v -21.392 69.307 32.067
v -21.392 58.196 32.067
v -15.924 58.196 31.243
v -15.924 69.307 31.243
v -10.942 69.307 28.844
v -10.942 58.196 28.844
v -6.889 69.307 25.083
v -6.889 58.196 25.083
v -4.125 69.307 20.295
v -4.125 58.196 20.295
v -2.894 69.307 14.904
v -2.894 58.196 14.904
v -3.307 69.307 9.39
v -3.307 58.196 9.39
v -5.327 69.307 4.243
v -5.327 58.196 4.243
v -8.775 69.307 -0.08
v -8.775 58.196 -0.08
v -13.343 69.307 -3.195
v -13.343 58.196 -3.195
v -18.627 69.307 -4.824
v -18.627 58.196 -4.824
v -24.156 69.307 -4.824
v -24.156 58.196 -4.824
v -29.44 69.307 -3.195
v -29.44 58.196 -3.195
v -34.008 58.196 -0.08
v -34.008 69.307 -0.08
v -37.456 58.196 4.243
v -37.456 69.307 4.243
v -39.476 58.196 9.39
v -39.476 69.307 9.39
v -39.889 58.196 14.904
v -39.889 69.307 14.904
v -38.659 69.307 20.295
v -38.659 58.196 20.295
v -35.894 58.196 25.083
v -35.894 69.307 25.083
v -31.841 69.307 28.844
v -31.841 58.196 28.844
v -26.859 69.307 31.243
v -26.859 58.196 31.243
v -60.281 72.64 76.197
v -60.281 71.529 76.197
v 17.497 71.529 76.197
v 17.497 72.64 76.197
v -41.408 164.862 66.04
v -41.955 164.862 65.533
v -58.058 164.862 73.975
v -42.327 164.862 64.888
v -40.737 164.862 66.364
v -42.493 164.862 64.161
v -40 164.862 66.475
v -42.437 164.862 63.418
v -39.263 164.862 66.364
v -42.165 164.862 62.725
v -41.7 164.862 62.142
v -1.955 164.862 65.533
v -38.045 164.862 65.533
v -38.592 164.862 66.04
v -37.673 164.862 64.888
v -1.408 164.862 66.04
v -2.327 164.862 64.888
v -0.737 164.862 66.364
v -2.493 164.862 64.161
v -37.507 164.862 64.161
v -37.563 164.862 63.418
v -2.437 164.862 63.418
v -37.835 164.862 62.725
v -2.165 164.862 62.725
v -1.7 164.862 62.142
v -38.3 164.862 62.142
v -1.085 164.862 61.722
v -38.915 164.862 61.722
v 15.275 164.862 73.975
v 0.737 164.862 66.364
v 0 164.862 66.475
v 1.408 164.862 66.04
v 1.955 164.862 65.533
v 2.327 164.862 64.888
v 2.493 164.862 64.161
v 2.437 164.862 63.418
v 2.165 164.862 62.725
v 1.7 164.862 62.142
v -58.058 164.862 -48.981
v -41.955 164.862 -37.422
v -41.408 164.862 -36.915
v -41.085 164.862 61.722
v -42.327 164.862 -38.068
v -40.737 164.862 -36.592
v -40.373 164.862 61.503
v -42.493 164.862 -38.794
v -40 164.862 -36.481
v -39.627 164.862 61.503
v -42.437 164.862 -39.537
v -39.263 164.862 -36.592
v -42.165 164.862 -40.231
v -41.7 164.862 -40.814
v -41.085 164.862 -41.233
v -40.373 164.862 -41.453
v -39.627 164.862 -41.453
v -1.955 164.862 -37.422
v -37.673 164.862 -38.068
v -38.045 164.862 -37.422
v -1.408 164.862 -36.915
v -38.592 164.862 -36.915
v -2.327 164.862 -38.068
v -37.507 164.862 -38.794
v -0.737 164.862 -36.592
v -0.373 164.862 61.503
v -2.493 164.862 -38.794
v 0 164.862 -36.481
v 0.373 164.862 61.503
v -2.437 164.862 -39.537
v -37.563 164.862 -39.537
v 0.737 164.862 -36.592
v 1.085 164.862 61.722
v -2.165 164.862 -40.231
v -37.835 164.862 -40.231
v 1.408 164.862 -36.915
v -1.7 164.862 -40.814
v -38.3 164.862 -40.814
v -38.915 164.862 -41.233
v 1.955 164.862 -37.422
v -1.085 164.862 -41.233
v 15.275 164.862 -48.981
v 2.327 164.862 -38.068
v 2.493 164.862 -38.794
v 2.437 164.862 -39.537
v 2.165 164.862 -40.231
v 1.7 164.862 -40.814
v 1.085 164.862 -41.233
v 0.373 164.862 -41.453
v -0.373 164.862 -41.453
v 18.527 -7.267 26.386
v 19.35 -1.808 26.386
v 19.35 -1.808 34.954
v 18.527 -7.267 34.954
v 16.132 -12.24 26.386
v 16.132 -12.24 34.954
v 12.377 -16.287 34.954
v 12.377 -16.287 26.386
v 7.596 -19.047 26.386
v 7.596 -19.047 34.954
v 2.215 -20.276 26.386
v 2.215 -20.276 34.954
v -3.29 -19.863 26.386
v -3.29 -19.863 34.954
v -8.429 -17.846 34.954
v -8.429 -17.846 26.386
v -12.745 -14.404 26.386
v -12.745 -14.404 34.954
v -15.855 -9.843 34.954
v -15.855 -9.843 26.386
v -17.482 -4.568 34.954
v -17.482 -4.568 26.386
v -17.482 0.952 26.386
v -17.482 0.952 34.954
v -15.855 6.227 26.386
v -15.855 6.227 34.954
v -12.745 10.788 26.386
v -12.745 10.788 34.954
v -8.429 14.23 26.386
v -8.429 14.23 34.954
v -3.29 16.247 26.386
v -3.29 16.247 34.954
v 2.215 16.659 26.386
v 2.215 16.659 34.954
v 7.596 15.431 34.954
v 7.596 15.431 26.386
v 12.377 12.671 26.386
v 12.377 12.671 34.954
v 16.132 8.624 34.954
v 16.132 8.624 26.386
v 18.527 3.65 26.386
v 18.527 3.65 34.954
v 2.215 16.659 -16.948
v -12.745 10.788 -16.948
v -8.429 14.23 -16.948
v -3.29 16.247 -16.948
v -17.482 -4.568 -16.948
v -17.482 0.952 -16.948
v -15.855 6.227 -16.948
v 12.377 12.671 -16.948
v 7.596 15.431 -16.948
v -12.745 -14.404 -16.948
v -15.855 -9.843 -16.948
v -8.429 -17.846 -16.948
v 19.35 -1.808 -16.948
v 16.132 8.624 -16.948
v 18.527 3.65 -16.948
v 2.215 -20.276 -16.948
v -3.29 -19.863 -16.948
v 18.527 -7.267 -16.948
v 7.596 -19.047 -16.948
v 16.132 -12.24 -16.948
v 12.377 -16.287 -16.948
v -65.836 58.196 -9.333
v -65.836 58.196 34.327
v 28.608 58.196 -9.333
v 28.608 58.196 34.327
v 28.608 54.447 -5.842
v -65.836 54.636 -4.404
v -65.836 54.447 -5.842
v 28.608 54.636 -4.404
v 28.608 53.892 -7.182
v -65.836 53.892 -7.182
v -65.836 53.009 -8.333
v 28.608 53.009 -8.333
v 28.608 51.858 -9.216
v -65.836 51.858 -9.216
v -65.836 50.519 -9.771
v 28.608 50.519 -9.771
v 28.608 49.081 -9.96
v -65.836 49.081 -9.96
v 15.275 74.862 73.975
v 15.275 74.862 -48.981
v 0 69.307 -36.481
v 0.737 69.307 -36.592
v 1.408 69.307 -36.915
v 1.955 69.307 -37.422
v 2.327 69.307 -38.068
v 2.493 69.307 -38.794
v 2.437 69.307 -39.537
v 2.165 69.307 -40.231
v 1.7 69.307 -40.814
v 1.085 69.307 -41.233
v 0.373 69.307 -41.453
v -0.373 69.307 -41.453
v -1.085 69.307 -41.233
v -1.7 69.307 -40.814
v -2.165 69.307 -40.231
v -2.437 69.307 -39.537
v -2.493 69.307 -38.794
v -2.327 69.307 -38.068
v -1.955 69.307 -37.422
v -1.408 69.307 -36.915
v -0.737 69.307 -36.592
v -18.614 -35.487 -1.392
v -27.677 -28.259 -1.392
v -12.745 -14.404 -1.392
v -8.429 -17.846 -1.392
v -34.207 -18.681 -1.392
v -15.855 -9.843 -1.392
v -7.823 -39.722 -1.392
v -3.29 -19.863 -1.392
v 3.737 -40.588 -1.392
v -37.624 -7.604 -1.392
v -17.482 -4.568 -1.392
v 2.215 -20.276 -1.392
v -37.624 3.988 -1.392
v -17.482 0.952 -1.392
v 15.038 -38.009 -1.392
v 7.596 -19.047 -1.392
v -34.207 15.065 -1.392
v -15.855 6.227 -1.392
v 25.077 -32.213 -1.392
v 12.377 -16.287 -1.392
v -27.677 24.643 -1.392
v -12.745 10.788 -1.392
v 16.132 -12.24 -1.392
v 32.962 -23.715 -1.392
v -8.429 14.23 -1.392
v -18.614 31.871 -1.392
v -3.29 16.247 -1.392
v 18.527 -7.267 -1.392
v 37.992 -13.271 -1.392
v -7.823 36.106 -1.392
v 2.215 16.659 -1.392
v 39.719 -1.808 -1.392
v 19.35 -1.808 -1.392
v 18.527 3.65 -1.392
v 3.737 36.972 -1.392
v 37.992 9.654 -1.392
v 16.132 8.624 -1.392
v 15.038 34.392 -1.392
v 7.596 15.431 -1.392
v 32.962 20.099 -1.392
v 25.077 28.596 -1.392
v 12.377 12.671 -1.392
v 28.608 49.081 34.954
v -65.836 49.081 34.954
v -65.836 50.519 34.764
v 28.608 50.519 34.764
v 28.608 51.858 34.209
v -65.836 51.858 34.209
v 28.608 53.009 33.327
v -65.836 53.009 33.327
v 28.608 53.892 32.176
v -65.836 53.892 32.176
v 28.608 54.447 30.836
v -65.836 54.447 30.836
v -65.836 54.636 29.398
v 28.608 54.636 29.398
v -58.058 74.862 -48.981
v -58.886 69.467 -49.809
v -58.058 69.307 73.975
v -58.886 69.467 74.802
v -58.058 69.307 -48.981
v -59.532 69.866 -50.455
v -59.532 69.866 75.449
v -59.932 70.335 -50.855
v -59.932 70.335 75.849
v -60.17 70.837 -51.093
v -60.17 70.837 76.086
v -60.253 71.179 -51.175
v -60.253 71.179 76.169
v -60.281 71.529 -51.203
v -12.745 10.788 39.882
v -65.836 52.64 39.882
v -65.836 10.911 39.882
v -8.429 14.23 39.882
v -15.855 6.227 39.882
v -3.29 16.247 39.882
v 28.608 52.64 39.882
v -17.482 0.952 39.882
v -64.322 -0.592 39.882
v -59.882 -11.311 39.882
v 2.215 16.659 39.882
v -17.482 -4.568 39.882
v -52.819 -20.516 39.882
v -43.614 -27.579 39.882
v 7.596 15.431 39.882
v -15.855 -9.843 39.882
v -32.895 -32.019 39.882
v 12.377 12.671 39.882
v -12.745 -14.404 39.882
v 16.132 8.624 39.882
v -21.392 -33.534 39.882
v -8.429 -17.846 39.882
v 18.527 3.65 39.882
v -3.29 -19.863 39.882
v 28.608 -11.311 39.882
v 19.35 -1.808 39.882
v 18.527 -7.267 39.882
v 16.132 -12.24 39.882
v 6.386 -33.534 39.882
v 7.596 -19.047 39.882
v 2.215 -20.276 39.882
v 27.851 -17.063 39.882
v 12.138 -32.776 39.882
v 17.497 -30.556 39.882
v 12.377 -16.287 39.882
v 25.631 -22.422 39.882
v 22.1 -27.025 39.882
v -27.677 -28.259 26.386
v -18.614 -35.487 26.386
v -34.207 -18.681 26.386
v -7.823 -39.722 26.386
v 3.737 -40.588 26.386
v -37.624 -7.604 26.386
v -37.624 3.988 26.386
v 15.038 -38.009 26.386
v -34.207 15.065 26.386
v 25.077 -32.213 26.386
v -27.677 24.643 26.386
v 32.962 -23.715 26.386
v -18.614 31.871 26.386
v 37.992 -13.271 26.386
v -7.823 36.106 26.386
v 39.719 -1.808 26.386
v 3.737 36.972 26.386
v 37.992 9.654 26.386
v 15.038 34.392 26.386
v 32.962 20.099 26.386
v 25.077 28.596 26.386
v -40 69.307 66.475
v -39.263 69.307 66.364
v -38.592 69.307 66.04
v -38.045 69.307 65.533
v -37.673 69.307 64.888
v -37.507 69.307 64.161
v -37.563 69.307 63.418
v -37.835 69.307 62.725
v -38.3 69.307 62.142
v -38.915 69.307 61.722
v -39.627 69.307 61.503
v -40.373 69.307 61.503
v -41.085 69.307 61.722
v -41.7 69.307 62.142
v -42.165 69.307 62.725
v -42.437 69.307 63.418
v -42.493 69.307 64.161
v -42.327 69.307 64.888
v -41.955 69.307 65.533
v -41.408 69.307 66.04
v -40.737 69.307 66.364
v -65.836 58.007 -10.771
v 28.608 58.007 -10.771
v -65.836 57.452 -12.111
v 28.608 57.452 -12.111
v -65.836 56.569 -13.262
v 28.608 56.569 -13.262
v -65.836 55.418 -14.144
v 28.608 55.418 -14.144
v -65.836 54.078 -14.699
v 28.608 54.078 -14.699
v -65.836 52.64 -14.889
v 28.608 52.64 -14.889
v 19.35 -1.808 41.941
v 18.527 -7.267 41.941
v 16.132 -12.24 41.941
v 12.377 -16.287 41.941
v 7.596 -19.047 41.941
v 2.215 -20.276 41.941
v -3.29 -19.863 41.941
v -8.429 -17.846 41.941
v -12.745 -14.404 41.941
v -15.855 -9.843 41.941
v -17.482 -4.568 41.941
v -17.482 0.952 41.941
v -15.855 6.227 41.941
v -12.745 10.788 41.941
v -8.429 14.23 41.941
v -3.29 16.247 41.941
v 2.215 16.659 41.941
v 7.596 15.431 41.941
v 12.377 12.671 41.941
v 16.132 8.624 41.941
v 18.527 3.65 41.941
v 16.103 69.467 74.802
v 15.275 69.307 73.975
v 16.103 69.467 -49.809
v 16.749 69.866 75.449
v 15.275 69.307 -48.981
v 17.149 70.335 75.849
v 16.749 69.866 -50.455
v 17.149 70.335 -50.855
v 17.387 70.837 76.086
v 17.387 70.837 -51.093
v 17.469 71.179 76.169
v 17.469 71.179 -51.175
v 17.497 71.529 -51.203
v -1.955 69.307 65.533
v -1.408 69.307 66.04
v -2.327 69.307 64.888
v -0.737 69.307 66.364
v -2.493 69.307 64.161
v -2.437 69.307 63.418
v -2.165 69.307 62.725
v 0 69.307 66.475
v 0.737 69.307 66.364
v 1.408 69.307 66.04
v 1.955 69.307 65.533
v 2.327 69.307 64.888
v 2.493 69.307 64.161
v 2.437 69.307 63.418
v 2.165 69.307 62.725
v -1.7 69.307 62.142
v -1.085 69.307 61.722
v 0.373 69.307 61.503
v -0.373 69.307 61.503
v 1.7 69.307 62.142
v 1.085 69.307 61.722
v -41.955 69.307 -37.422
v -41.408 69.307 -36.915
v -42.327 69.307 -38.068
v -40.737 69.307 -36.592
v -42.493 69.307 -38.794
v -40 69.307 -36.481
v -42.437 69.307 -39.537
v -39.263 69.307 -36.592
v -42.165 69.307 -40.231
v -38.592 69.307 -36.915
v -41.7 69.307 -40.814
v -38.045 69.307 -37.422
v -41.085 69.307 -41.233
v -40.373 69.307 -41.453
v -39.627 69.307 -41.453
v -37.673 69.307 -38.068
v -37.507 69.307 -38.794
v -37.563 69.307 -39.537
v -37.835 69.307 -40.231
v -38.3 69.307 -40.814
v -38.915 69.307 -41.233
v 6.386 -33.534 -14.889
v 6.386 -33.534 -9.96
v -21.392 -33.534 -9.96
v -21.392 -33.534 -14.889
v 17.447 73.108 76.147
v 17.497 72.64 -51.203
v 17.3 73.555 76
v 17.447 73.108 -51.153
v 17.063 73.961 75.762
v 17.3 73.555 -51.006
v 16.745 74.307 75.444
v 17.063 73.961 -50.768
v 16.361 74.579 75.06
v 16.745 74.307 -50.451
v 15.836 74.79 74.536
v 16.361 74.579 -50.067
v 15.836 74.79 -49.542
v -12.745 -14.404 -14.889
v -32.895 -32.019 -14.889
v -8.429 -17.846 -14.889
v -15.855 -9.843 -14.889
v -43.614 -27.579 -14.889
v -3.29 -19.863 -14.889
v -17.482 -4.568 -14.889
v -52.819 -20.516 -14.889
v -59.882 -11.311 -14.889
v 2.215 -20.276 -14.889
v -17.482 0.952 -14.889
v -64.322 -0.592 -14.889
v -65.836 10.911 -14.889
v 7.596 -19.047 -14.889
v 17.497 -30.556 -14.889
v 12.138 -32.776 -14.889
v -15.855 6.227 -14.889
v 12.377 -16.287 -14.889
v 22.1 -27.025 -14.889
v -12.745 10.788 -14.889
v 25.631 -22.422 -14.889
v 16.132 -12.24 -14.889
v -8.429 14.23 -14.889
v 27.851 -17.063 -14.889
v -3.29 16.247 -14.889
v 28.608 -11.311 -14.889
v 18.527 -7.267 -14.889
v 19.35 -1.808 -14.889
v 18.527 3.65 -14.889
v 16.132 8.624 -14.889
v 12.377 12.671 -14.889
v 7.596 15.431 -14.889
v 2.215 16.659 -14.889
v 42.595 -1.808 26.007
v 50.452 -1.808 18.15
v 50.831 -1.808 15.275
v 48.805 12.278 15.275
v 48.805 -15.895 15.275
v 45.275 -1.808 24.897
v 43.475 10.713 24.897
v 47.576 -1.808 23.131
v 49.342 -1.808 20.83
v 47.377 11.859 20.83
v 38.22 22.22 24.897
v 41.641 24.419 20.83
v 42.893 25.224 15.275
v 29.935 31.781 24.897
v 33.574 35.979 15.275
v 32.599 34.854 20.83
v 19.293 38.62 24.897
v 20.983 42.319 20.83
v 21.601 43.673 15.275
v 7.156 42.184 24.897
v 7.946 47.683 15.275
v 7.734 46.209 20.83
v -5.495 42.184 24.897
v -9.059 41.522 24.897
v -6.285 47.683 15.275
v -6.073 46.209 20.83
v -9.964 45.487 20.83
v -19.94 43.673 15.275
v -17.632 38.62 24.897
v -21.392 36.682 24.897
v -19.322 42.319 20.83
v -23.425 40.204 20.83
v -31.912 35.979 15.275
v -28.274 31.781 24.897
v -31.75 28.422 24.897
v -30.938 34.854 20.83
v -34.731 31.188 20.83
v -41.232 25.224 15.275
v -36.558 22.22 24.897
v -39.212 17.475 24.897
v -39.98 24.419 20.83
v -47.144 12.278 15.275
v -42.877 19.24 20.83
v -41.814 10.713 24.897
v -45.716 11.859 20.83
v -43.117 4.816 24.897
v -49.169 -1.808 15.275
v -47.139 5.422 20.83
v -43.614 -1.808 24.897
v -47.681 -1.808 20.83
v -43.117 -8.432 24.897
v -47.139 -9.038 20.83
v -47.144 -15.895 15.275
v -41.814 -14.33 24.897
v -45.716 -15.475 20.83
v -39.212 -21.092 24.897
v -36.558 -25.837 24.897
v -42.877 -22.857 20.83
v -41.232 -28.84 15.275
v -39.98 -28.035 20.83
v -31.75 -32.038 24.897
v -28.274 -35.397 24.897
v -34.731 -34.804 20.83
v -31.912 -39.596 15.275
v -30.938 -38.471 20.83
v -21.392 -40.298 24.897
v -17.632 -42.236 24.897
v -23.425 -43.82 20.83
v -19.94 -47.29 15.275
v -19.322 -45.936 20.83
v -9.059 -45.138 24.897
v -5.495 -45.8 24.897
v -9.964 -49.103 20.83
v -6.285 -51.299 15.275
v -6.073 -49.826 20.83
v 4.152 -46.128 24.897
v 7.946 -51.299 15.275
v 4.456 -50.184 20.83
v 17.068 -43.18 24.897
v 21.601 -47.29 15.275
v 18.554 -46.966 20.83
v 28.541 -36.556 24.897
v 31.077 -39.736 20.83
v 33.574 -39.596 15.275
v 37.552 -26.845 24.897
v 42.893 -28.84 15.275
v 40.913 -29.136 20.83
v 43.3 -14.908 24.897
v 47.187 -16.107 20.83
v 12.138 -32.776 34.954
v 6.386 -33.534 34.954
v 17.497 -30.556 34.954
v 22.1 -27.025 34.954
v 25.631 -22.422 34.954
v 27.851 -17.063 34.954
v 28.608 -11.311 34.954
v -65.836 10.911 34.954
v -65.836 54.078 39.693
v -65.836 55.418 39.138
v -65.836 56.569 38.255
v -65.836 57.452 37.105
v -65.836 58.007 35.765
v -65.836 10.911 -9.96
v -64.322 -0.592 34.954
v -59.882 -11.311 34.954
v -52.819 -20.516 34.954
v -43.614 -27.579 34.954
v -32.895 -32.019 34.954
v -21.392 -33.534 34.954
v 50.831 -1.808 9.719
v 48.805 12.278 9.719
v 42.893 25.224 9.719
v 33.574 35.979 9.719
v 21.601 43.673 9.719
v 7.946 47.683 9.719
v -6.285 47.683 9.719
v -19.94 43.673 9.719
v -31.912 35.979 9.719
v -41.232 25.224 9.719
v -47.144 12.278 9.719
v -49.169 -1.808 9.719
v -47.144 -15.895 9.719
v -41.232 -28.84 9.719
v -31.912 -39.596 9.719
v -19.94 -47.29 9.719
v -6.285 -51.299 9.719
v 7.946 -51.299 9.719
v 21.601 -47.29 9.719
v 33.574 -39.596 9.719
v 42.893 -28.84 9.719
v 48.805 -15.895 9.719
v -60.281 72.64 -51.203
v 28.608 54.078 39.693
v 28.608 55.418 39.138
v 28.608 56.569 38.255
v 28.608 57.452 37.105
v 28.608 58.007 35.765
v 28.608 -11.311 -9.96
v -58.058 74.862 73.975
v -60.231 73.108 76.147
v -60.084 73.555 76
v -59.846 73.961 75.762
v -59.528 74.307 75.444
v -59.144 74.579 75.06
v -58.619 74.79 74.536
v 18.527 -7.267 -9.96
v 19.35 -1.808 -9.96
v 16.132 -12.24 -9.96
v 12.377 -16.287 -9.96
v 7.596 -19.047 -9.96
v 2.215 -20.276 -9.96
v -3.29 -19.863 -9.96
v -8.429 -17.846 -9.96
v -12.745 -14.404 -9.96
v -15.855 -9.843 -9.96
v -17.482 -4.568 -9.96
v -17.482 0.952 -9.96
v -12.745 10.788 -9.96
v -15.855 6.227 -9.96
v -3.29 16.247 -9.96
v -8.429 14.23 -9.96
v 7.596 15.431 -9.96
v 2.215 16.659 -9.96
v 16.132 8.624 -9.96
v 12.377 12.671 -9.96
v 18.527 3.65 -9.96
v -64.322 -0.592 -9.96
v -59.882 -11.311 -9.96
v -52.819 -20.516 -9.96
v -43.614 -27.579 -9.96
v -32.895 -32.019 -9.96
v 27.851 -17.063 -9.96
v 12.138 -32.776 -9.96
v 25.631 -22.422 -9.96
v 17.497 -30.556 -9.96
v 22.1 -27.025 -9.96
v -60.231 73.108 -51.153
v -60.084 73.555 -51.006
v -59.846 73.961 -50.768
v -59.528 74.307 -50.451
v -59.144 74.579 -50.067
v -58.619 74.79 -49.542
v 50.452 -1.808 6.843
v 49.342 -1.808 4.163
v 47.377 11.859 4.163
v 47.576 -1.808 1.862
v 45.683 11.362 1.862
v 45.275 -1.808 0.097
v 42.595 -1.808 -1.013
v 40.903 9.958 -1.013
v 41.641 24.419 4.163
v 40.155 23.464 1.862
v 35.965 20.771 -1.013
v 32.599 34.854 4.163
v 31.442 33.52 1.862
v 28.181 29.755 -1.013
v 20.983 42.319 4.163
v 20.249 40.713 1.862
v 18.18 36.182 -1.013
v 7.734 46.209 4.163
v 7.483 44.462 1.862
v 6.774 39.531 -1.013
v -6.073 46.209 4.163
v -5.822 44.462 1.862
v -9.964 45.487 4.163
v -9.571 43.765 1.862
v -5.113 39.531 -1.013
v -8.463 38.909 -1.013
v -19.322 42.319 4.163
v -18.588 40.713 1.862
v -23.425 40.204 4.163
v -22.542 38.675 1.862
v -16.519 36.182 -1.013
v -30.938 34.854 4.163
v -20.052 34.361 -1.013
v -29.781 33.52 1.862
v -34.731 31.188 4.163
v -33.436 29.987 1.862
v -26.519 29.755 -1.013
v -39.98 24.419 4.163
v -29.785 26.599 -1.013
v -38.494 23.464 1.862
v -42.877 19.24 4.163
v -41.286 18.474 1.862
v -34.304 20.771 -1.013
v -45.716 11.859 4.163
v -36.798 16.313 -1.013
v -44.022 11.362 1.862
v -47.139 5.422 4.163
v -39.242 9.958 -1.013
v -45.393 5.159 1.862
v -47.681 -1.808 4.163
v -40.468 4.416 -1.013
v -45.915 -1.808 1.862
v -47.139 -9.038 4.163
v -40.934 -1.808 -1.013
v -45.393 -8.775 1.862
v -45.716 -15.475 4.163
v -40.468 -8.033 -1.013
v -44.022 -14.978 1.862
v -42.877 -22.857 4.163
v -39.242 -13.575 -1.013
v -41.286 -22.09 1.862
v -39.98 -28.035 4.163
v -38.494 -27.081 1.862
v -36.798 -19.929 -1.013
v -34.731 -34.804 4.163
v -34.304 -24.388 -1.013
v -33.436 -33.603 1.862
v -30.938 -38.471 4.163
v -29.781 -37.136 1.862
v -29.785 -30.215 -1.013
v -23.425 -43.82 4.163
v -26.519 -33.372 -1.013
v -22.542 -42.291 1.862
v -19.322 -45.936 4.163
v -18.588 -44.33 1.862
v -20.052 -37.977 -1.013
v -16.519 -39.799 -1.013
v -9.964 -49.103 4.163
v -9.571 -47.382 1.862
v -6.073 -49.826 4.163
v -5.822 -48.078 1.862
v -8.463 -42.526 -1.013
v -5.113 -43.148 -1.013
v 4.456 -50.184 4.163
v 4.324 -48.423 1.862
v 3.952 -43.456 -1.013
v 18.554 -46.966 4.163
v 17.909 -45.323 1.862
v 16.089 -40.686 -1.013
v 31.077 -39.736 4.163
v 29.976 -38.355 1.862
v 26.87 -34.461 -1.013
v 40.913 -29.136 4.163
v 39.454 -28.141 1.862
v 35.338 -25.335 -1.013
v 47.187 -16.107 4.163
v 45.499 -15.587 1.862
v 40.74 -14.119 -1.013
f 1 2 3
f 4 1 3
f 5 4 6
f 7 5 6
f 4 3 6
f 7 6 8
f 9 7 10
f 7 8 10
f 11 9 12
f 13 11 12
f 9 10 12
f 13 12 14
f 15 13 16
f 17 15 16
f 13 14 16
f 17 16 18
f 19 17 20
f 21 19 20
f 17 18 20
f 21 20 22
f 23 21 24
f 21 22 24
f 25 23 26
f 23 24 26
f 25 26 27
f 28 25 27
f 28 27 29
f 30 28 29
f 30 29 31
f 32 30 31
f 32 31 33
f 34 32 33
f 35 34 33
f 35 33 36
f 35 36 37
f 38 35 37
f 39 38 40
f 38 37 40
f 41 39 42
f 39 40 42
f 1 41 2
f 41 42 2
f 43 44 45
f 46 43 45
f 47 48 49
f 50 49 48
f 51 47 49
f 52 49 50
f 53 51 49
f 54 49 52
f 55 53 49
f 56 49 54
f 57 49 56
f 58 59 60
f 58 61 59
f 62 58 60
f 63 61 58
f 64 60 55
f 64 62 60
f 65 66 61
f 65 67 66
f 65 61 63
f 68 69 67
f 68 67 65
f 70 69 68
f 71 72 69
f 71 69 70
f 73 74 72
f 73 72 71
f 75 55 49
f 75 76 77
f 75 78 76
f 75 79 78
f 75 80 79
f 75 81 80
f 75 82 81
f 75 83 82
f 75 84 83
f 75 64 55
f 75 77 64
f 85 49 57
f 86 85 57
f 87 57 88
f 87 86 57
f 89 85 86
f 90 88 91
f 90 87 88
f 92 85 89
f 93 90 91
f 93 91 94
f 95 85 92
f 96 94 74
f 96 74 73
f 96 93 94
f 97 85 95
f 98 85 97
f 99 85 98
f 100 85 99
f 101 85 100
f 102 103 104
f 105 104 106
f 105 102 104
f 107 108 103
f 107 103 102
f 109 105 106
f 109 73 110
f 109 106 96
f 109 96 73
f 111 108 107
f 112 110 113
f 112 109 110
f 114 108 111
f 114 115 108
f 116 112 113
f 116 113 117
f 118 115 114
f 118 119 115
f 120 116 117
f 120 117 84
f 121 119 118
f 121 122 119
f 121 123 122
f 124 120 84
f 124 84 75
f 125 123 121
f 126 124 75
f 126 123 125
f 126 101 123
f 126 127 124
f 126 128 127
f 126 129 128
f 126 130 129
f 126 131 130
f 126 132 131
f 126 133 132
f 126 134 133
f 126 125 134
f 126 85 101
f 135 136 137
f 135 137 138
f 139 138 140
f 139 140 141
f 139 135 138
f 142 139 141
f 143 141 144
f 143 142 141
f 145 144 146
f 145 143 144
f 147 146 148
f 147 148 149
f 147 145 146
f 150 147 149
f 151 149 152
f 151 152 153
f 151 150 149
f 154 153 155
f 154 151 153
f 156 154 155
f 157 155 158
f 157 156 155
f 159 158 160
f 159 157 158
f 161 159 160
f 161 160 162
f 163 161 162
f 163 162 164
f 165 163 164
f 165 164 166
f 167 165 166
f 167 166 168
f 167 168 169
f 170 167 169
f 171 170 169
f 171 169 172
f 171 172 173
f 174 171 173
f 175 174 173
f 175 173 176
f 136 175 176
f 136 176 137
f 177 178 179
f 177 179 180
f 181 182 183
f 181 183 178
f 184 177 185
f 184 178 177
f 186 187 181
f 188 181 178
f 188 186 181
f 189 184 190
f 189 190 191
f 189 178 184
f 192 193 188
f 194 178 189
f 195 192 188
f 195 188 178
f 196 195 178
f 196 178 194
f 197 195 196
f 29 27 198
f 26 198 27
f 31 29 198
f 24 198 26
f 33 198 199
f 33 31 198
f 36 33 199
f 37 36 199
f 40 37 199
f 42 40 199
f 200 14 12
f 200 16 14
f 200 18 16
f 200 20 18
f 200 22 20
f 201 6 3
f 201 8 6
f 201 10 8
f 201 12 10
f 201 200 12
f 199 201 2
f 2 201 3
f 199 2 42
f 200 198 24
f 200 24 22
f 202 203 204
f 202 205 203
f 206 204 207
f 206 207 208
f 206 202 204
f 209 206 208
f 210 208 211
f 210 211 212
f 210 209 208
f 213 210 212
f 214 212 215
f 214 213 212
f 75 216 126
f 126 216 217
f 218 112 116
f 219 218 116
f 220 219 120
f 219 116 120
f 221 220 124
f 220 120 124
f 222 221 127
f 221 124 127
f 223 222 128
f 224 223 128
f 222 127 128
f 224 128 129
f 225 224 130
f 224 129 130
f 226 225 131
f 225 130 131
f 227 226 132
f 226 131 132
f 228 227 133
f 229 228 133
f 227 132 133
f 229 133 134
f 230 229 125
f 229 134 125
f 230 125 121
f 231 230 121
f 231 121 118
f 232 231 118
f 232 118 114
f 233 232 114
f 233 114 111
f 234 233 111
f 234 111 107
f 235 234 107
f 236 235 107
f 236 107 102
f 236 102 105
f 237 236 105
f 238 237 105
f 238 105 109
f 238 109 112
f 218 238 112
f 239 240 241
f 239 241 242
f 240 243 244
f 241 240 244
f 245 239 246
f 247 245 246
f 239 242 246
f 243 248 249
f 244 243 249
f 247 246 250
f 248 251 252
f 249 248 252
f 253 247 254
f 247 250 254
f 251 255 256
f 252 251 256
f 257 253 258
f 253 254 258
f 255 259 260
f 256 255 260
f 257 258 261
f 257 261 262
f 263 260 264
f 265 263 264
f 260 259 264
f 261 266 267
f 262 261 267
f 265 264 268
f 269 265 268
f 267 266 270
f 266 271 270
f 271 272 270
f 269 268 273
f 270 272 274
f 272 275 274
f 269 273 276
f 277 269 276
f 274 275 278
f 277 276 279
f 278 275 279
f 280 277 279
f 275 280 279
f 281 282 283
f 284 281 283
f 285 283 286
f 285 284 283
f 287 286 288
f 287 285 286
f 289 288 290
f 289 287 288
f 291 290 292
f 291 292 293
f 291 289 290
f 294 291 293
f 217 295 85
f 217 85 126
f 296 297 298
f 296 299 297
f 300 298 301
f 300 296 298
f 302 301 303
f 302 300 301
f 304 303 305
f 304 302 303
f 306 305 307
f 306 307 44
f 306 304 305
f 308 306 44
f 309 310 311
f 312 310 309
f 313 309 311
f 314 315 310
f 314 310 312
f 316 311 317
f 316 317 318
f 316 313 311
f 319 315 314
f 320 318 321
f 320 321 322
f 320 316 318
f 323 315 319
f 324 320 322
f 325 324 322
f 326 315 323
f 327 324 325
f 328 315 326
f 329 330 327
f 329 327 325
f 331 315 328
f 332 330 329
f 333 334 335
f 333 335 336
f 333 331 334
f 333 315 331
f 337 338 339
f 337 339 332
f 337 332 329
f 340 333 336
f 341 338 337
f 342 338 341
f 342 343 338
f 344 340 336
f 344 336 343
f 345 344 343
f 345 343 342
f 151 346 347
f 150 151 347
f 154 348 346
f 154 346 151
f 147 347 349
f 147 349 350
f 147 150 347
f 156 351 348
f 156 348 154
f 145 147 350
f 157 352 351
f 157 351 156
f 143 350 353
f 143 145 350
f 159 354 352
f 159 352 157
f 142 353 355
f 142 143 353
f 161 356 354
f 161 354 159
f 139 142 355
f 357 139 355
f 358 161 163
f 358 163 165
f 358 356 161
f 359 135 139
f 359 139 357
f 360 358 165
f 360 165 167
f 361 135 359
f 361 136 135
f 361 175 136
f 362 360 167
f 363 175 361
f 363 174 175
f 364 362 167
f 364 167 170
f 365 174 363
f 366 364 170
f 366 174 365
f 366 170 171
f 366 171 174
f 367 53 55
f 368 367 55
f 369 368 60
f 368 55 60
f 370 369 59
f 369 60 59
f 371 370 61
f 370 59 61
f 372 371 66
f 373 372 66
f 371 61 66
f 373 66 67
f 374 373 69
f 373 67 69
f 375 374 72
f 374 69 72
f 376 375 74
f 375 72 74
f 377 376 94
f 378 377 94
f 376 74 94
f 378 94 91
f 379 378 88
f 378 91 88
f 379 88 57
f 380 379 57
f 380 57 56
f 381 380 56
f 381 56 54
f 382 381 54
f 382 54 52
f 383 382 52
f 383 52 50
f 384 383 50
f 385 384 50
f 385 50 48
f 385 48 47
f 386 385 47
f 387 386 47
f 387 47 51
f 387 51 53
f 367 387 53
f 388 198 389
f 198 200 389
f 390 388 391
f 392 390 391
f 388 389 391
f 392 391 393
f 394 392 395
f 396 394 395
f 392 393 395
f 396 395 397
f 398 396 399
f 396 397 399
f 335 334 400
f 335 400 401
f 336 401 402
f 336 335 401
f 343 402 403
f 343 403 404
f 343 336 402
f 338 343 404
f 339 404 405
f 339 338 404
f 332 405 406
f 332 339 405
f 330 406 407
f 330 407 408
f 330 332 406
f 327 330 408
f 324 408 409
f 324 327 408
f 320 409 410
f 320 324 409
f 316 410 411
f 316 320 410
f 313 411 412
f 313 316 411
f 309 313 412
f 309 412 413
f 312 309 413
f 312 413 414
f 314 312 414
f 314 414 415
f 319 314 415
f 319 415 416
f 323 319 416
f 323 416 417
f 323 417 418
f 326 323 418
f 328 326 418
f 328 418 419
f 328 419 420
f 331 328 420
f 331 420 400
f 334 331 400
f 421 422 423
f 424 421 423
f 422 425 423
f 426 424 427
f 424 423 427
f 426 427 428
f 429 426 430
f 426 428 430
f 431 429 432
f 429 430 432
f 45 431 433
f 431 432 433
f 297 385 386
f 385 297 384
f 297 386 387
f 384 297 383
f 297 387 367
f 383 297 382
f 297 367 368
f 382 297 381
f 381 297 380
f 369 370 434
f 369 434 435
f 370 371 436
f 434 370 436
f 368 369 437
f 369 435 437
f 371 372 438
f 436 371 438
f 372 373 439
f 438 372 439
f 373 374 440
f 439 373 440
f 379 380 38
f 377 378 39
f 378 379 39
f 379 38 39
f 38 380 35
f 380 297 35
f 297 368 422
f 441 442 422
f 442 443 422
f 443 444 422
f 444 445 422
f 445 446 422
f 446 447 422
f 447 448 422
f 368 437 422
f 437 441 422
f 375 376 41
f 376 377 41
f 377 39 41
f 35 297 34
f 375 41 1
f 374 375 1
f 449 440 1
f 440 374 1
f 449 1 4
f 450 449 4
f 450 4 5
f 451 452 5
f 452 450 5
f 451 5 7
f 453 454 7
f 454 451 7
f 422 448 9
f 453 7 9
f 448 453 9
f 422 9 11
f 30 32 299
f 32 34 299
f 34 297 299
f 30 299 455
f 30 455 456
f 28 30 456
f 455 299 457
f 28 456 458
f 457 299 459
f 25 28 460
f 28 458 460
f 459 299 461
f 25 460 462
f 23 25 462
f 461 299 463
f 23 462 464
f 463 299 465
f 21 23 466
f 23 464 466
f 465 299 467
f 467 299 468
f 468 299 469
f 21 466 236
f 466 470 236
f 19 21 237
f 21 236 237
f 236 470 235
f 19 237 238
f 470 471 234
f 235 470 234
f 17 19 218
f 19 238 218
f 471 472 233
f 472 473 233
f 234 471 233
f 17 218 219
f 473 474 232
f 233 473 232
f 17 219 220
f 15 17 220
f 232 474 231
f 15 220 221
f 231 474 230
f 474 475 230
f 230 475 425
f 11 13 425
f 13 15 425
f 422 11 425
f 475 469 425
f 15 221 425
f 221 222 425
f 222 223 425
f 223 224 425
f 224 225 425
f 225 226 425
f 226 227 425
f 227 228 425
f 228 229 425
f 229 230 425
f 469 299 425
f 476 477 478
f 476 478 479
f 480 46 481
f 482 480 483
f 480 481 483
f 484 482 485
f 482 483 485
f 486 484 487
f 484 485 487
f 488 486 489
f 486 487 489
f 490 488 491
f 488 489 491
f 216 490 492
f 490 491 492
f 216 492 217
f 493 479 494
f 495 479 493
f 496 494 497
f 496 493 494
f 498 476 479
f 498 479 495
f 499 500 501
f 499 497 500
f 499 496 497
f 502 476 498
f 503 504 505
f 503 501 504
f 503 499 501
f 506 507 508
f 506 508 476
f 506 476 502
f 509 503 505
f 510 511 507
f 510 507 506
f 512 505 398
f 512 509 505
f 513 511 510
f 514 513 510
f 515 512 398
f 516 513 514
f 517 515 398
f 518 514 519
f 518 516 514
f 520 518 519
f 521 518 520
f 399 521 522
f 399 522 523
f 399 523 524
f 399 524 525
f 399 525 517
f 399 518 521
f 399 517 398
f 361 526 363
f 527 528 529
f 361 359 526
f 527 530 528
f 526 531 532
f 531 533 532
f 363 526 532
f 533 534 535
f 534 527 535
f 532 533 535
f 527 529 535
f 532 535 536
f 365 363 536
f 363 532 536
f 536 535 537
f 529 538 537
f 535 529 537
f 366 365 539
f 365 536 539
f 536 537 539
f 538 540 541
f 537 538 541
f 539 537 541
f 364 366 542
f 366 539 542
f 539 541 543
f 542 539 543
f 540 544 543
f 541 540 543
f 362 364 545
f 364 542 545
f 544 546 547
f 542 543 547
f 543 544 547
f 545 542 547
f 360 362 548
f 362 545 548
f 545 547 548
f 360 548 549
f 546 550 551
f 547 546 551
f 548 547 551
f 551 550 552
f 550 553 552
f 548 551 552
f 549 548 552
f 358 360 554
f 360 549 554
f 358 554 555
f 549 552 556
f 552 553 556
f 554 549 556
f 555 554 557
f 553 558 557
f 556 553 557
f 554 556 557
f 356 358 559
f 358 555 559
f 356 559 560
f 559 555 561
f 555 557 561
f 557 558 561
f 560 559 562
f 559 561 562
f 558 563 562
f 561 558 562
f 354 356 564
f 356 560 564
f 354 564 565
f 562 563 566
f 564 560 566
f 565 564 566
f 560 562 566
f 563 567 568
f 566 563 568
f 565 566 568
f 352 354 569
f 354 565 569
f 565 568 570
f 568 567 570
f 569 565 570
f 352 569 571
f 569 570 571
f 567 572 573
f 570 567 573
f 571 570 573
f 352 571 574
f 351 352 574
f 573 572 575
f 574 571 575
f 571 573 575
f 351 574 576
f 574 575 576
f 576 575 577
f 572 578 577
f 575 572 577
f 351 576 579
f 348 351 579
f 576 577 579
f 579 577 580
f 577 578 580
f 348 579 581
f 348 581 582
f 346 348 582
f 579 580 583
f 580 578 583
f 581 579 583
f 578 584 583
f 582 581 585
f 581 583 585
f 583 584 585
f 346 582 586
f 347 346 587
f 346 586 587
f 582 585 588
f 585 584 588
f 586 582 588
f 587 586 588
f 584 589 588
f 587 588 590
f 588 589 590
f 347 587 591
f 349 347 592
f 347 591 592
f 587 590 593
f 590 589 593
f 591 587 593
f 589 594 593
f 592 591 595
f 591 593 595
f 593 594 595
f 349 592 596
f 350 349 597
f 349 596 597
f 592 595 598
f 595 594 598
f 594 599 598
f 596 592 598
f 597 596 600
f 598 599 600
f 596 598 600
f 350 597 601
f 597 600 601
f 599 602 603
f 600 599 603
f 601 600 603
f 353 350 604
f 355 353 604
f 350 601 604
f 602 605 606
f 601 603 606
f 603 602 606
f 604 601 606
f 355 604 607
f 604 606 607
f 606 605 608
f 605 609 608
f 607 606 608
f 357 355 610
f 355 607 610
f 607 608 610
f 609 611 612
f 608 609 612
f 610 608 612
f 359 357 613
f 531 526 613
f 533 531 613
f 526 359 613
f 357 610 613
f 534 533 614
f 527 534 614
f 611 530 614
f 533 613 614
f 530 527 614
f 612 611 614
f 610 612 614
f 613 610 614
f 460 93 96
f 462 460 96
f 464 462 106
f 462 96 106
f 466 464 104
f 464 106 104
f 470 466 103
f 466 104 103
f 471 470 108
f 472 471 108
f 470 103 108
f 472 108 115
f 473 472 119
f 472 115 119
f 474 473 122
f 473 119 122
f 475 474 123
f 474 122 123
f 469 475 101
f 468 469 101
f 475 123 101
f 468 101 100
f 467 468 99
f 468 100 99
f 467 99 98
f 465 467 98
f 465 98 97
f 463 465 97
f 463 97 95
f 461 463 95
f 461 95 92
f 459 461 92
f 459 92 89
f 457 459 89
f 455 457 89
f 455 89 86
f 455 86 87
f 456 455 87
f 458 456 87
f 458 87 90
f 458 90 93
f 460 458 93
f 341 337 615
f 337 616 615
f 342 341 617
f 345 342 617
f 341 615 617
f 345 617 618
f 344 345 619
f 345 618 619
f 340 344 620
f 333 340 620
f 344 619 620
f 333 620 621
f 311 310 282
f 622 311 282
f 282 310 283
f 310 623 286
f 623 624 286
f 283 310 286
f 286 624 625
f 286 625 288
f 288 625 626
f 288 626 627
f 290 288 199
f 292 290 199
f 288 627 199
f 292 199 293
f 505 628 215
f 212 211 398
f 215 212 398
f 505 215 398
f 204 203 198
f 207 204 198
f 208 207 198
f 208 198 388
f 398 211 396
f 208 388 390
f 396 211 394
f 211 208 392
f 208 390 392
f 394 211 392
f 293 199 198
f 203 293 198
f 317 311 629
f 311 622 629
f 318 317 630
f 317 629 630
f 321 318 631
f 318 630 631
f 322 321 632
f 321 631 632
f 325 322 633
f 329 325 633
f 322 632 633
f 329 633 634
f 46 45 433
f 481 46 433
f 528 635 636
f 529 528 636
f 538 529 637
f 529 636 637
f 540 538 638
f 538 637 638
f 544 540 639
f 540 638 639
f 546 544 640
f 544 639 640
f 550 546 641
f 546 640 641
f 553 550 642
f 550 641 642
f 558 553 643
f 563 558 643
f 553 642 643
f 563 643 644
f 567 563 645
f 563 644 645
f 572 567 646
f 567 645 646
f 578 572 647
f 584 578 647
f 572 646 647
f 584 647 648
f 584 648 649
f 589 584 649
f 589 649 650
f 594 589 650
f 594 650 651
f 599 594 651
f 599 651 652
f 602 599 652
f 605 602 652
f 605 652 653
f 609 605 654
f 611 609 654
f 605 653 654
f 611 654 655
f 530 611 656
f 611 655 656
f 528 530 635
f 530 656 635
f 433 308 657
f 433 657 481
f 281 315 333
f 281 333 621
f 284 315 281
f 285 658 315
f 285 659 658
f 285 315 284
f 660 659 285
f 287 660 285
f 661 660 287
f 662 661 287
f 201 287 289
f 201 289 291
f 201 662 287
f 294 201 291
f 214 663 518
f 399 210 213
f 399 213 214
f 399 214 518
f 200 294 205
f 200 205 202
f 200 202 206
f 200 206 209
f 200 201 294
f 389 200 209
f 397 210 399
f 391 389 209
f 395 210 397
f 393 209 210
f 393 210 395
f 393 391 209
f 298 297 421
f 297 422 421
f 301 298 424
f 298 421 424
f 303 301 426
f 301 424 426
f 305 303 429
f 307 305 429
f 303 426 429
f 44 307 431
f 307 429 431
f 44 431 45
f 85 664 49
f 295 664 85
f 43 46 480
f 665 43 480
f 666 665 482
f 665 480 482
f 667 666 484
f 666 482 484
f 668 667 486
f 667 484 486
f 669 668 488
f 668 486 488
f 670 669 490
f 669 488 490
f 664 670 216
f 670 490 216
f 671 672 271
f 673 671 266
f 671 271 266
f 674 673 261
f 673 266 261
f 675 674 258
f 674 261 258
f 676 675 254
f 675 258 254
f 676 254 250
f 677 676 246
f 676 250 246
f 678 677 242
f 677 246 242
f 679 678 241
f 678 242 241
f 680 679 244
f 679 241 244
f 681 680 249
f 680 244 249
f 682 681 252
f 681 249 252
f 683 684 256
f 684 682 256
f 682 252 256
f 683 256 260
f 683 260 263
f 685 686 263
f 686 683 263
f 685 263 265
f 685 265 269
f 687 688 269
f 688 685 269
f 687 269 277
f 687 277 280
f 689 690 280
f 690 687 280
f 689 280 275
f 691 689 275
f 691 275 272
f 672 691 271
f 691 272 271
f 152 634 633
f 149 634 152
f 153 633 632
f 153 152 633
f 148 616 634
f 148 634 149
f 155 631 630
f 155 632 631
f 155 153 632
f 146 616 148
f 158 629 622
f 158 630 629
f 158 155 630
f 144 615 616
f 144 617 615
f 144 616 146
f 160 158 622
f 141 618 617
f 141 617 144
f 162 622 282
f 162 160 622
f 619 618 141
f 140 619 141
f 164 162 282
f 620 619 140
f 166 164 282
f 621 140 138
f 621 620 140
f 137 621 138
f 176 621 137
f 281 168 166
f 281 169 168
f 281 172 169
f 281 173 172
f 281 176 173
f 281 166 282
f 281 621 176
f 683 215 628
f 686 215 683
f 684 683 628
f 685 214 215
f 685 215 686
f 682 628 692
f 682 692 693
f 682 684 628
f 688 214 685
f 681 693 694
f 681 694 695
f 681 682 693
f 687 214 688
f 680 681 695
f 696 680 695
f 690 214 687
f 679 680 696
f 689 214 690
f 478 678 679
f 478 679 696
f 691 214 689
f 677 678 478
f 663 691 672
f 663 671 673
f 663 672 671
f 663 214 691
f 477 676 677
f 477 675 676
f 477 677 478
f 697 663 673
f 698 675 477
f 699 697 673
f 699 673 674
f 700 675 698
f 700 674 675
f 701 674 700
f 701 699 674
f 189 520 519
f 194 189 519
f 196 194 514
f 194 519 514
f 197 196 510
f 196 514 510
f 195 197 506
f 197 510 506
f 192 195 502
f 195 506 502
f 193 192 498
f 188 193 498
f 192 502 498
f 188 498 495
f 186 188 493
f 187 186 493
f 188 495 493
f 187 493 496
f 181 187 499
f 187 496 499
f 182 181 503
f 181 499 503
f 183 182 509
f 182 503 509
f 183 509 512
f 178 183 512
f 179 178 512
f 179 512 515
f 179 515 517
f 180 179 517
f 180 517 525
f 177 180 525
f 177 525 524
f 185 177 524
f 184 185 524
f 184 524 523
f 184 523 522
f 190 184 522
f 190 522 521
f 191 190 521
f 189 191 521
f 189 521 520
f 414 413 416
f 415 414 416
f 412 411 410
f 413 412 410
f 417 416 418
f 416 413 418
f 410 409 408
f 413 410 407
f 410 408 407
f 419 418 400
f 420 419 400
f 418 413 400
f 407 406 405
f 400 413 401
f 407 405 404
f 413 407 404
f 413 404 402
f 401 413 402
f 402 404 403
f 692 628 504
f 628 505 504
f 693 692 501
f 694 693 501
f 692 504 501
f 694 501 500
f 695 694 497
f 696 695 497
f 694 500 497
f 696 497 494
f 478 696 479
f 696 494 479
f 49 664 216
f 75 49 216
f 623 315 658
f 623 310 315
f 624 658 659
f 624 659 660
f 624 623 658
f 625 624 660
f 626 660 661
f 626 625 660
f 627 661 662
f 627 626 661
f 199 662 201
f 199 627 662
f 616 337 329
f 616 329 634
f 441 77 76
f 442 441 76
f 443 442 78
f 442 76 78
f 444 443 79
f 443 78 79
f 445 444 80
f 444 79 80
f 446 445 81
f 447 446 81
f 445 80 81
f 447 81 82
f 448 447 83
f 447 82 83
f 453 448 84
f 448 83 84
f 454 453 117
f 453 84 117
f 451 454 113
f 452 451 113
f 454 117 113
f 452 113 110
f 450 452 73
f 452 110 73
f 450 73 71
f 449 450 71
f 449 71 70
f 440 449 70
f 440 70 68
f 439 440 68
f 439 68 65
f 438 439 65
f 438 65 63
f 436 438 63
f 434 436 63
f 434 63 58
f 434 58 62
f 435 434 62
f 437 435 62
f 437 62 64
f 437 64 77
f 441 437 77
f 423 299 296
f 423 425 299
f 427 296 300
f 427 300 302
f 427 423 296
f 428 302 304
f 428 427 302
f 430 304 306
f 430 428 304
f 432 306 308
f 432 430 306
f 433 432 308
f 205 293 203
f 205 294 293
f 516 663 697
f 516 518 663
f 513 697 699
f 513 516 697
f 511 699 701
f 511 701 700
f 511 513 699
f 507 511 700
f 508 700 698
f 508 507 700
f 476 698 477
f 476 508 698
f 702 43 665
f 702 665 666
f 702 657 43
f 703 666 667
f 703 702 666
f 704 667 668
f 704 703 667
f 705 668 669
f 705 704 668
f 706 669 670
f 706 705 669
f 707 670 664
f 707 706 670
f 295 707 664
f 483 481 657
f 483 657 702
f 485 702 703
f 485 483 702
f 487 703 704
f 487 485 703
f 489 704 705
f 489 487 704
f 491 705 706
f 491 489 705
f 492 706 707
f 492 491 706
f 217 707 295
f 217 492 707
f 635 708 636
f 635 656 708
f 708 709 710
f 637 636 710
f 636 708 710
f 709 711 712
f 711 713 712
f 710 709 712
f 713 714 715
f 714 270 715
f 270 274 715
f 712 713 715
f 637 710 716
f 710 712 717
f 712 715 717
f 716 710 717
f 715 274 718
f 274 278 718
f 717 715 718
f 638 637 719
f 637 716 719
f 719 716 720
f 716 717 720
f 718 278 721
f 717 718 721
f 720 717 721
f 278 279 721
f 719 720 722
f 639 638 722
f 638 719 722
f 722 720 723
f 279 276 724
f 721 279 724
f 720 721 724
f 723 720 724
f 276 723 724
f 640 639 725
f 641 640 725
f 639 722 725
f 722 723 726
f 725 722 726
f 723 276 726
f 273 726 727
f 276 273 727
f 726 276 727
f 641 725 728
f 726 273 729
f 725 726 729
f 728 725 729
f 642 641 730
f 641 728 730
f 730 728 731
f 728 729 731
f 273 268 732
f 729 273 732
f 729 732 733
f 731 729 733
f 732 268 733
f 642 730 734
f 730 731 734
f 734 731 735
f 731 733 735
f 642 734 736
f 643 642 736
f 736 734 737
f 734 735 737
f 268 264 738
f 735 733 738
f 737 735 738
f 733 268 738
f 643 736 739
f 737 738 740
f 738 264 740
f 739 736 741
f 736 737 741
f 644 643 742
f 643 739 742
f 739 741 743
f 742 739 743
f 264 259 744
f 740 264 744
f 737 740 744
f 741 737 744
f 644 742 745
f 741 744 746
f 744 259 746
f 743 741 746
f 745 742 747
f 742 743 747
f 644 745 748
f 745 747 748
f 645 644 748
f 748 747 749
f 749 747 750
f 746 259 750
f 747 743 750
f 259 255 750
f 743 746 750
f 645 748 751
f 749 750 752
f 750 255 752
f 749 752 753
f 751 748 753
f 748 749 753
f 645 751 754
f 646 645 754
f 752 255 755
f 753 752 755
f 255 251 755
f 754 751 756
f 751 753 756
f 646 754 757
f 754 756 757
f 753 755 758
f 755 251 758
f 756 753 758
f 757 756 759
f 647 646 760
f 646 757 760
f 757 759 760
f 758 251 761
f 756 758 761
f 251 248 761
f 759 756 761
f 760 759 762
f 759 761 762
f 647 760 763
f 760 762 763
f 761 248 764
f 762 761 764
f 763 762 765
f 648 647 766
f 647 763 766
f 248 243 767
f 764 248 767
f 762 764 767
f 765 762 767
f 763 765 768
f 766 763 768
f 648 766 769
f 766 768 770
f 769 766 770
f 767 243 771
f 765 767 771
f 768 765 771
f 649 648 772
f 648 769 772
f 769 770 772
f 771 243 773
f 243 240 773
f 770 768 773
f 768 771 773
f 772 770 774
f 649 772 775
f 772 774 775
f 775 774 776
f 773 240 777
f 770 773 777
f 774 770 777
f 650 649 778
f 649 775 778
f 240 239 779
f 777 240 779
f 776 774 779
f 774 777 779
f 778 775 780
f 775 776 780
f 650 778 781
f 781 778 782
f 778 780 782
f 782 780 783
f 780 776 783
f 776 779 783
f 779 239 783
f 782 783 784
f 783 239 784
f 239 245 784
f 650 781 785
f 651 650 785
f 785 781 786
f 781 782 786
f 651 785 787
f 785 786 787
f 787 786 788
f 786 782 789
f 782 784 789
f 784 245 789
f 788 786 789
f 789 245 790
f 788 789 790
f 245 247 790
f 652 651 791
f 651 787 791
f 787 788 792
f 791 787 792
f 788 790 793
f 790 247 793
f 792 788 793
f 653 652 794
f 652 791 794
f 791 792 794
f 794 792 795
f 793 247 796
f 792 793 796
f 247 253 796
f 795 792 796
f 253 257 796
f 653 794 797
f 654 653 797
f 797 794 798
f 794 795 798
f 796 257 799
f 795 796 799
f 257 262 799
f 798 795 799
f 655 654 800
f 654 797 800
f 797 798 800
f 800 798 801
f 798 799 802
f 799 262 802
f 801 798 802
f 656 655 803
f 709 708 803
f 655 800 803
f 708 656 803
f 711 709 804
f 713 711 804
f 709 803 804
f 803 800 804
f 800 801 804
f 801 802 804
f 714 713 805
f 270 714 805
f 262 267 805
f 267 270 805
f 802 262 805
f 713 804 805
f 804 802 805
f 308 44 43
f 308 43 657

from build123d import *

# Parameters (mm, degrees)
SKETCH1_R                = 45
BOSS_EXTRUDE1_DEPTH      = 25
BOSS_EXTRUDE2_DEPTH      = 25
BOSS_EXTRUDE2_DEPTH_BACK = 60
SKETCH3_R                = 16.694420179
BOSS_EXTRUDE3_DEPTH      = 10
SKETCH4_W                = 70
SKETCH4_H                = 114.66
BOSS_EXTRUDE4_DEPTH      = 5
SKETCH5_R                = 16.667292011
BOSS_EXTRUDE5_DEPTH      = 14
BOSS_EXTRUDE5_DEPTH_BACK = 39
FILLET1_R                = 10
FILLET2_R                = 40
FILLET3_R                = 20
FILLET4_R                = 5
FILLET5_R                = 2
SCALE1_SCALE             = 1.111111111
SKETCH6_W                = 73.333333333
SKETCH6_H                = 122.955555555
BOSS_EXTRUDE6_DEPTH      = 90
SKETCH7_R                = 2.5
CUT_EXTRUDE1_DEPTH       = 239.92789275
CUT_EXTRUDE1_DEPTH_BACK  = 239.92789275


with BuildPart() as part:
    # Sketch1 → Boss-Extrude1 (new body)
    with BuildSketch(Plane.XY):
        Circle(SKETCH1_R)
    extrude(amount=BOSS_EXTRUDE1_DEPTH)



with BuildPart() as body_2:
    # Sketch2 → Boss-Extrude2 (new, two sides)
    with BuildSketch(Plane(origin=(0, 0, 0), x_dir=(0, 0, -1), z_dir=(1, 0, 0))) as boss_extrude2_sk:
        Polygon((-32.711176171, -28.552814356), (-32.711176171, 50.79995961), (7.711176171, 50.79995961), (7.711176171, -28.552814356), (12.147045523, -28.552814356), (12.147045523, 54.003643031), (-37.147045523, 54.003643031), (-37.147045523, -28.552814356), align=None)
    extrude(amount=BOSS_EXTRUDE2_DEPTH)
    extrude(boss_extrude2_sk.sketch, amount=-BOSS_EXTRUDE2_DEPTH_BACK)

    # Sketch3 → Boss-Extrude3 (add)
    with BuildSketch(Plane(origin=(0, 54.003643031, 0), x_dir=(1, 0, 0), z_dir=(0, 1, 0))):
        with Locations(Location((-20, -13.418920015, 0), (0, 0, 270))):
            Circle(SKETCH3_R)
    extrude(amount=BOSS_EXTRUDE3_DEPTH)

    # Sketch4 → Boss-Extrude4 (add)
    with BuildSketch(Plane(origin=(0, 64.003643031, 0), x_dir=(1, 0, 0), z_dir=(0, 1, 0))):
        with Locations((-20, -12.5)):
            Rectangle(SKETCH4_W, SKETCH4_H)
    extrude(amount=BOSS_EXTRUDE4_DEPTH)


with BuildPart() as part_1:
    add(part.part)

    add(body_2.part)  # Boss-Extrude5 merges body 2
    # Sketch5 → Boss-Extrude5 (add, two sides)
    with BuildSketch(Plane(origin=(0, 0, 0), x_dir=(-1, 0, 0), z_dir=(0, 0, -1))) as boss_extrude5_sk:
        with Locations(Location((0, 0, 0), (0, 0, 180))):
            Circle(SKETCH5_R)
    extrude(amount=BOSS_EXTRUDE5_DEPTH)
    extrude(boss_extrude5_sk.sketch, amount=-BOSS_EXTRUDE5_DEPTH_BACK)

    # Fillet1
    fillet1_edges = [part_1.edges().sort_by_distance(p)[0] for p in [
        (-45, 0, 0),
        (-45, 0, 25),
    ]]
    fillet(fillet1_edges, radius=FILLET1_R)

    # Fillet2
    fillet2_edges = [part_1.edges().sort_by_distance(p)[0] for p in [
        (-60, -28.552814356, 34.929110847),
        (-60, -28.552814356, -9.929110847),
    ]]
    fillet(fillet2_edges, radius=FILLET2_R)

    # Fillet3
    fillet3_edges = [part_1.edges().sort_by_distance(p)[0] for p in [
        (25, -28.552814356, 34.929110847),
        (25, -28.552814356, -9.929110847),
    ]]
    fillet(fillet3_edges, radius=FILLET3_R)

    # Fillet4
    fillet4_edges = [part_1.edges().sort_by_distance(p)[0] for p in [
        (-17.5, 54.003643031, 37.147045523),
        (-17.5, 54.003643031, -12.147045523),
        (-17.5, 50.79995961, -7.711176171),
        (-17.5, 50.79995961, 32.711176171),
    ]]
    fillet(fillet4_edges, radius=FILLET4_R)

    # Fillet5
    fillet5_edges = [part_1.edges().sort_by_distance(p)[0] for p in [
        (-55, 64.003643031, 12.5),
        (-20, 64.003643031, 69.83),
        (15, 64.003643031, 12.5),
        (-20, 64.003643031, -44.83),
        (-55, 69.003643031, 12.5),
        (-20, 69.003643031, 69.83),
        (15, 69.003643031, 12.5),
        (-20, 69.003643031, -44.83),
    ]]
    fillet(fillet5_edges, radius=FILLET5_R)


with BuildPart() as part_2:
    # Scale1: scaled about (-7.475087619, 16.274033837, 12.528539565)
    add(part_1.part.scale(SCALE1_SCALE).moved(Location((0.830565291, -1.808225982, -1.392059952))))


with BuildPart() as boss_extrude6_tool:
    # Sketch6 → Boss-Extrude6 (new body)
    with BuildSketch(Plane(origin=(0, 74.862466329, 0), x_dir=(1, 0, 0), z_dir=(0, 1, 0))):
        with Locations((-21.391645996, -12.49682915)):
            Rectangle(SKETCH6_W, SKETCH6_H)
    extrude(amount=BOSS_EXTRUDE6_DEPTH)


with BuildPart() as part_3:
    add(part_2.part)


with BuildPart() as part_4:
    # Boss-Extrude6: joined with boss_extrude6_tool
    add(part_3.part.fuse(boss_extrude6_tool.part, tol=0.00001))

    # Sketch7 → Cut-Extrude1 (cut, two sides)
    with BuildSketch(Plane(origin=(0, 164.862466329, 0), x_dir=(1, 0, 0), z_dir=(0, 1, 0))) as cut_extrude1_sk:
        with Locations(Location((0, 38.980948628, 0), (0, 0, 270))):
            Circle(SKETCH7_R)
        with Locations(Location((-40, 38.980948628, 0), (0, 0, 270))):
            Circle(SKETCH7_R)
        with Locations(Location((0, -63.974606927, 0), (0, 0, 270))):
            Circle(SKETCH7_R)
        with Locations(Location((-40, -63.974606927, 0), (0, 0, 270))):
            Circle(SKETCH7_R)
    extrude(amount=CUT_EXTRUDE1_DEPTH, mode=Mode.SUBTRACT)
    extrude(cut_extrude1_sk.sketch, amount=-CUT_EXTRUDE1_DEPTH_BACK, mode=Mode.SUBTRACT)


solid = part_4.part
